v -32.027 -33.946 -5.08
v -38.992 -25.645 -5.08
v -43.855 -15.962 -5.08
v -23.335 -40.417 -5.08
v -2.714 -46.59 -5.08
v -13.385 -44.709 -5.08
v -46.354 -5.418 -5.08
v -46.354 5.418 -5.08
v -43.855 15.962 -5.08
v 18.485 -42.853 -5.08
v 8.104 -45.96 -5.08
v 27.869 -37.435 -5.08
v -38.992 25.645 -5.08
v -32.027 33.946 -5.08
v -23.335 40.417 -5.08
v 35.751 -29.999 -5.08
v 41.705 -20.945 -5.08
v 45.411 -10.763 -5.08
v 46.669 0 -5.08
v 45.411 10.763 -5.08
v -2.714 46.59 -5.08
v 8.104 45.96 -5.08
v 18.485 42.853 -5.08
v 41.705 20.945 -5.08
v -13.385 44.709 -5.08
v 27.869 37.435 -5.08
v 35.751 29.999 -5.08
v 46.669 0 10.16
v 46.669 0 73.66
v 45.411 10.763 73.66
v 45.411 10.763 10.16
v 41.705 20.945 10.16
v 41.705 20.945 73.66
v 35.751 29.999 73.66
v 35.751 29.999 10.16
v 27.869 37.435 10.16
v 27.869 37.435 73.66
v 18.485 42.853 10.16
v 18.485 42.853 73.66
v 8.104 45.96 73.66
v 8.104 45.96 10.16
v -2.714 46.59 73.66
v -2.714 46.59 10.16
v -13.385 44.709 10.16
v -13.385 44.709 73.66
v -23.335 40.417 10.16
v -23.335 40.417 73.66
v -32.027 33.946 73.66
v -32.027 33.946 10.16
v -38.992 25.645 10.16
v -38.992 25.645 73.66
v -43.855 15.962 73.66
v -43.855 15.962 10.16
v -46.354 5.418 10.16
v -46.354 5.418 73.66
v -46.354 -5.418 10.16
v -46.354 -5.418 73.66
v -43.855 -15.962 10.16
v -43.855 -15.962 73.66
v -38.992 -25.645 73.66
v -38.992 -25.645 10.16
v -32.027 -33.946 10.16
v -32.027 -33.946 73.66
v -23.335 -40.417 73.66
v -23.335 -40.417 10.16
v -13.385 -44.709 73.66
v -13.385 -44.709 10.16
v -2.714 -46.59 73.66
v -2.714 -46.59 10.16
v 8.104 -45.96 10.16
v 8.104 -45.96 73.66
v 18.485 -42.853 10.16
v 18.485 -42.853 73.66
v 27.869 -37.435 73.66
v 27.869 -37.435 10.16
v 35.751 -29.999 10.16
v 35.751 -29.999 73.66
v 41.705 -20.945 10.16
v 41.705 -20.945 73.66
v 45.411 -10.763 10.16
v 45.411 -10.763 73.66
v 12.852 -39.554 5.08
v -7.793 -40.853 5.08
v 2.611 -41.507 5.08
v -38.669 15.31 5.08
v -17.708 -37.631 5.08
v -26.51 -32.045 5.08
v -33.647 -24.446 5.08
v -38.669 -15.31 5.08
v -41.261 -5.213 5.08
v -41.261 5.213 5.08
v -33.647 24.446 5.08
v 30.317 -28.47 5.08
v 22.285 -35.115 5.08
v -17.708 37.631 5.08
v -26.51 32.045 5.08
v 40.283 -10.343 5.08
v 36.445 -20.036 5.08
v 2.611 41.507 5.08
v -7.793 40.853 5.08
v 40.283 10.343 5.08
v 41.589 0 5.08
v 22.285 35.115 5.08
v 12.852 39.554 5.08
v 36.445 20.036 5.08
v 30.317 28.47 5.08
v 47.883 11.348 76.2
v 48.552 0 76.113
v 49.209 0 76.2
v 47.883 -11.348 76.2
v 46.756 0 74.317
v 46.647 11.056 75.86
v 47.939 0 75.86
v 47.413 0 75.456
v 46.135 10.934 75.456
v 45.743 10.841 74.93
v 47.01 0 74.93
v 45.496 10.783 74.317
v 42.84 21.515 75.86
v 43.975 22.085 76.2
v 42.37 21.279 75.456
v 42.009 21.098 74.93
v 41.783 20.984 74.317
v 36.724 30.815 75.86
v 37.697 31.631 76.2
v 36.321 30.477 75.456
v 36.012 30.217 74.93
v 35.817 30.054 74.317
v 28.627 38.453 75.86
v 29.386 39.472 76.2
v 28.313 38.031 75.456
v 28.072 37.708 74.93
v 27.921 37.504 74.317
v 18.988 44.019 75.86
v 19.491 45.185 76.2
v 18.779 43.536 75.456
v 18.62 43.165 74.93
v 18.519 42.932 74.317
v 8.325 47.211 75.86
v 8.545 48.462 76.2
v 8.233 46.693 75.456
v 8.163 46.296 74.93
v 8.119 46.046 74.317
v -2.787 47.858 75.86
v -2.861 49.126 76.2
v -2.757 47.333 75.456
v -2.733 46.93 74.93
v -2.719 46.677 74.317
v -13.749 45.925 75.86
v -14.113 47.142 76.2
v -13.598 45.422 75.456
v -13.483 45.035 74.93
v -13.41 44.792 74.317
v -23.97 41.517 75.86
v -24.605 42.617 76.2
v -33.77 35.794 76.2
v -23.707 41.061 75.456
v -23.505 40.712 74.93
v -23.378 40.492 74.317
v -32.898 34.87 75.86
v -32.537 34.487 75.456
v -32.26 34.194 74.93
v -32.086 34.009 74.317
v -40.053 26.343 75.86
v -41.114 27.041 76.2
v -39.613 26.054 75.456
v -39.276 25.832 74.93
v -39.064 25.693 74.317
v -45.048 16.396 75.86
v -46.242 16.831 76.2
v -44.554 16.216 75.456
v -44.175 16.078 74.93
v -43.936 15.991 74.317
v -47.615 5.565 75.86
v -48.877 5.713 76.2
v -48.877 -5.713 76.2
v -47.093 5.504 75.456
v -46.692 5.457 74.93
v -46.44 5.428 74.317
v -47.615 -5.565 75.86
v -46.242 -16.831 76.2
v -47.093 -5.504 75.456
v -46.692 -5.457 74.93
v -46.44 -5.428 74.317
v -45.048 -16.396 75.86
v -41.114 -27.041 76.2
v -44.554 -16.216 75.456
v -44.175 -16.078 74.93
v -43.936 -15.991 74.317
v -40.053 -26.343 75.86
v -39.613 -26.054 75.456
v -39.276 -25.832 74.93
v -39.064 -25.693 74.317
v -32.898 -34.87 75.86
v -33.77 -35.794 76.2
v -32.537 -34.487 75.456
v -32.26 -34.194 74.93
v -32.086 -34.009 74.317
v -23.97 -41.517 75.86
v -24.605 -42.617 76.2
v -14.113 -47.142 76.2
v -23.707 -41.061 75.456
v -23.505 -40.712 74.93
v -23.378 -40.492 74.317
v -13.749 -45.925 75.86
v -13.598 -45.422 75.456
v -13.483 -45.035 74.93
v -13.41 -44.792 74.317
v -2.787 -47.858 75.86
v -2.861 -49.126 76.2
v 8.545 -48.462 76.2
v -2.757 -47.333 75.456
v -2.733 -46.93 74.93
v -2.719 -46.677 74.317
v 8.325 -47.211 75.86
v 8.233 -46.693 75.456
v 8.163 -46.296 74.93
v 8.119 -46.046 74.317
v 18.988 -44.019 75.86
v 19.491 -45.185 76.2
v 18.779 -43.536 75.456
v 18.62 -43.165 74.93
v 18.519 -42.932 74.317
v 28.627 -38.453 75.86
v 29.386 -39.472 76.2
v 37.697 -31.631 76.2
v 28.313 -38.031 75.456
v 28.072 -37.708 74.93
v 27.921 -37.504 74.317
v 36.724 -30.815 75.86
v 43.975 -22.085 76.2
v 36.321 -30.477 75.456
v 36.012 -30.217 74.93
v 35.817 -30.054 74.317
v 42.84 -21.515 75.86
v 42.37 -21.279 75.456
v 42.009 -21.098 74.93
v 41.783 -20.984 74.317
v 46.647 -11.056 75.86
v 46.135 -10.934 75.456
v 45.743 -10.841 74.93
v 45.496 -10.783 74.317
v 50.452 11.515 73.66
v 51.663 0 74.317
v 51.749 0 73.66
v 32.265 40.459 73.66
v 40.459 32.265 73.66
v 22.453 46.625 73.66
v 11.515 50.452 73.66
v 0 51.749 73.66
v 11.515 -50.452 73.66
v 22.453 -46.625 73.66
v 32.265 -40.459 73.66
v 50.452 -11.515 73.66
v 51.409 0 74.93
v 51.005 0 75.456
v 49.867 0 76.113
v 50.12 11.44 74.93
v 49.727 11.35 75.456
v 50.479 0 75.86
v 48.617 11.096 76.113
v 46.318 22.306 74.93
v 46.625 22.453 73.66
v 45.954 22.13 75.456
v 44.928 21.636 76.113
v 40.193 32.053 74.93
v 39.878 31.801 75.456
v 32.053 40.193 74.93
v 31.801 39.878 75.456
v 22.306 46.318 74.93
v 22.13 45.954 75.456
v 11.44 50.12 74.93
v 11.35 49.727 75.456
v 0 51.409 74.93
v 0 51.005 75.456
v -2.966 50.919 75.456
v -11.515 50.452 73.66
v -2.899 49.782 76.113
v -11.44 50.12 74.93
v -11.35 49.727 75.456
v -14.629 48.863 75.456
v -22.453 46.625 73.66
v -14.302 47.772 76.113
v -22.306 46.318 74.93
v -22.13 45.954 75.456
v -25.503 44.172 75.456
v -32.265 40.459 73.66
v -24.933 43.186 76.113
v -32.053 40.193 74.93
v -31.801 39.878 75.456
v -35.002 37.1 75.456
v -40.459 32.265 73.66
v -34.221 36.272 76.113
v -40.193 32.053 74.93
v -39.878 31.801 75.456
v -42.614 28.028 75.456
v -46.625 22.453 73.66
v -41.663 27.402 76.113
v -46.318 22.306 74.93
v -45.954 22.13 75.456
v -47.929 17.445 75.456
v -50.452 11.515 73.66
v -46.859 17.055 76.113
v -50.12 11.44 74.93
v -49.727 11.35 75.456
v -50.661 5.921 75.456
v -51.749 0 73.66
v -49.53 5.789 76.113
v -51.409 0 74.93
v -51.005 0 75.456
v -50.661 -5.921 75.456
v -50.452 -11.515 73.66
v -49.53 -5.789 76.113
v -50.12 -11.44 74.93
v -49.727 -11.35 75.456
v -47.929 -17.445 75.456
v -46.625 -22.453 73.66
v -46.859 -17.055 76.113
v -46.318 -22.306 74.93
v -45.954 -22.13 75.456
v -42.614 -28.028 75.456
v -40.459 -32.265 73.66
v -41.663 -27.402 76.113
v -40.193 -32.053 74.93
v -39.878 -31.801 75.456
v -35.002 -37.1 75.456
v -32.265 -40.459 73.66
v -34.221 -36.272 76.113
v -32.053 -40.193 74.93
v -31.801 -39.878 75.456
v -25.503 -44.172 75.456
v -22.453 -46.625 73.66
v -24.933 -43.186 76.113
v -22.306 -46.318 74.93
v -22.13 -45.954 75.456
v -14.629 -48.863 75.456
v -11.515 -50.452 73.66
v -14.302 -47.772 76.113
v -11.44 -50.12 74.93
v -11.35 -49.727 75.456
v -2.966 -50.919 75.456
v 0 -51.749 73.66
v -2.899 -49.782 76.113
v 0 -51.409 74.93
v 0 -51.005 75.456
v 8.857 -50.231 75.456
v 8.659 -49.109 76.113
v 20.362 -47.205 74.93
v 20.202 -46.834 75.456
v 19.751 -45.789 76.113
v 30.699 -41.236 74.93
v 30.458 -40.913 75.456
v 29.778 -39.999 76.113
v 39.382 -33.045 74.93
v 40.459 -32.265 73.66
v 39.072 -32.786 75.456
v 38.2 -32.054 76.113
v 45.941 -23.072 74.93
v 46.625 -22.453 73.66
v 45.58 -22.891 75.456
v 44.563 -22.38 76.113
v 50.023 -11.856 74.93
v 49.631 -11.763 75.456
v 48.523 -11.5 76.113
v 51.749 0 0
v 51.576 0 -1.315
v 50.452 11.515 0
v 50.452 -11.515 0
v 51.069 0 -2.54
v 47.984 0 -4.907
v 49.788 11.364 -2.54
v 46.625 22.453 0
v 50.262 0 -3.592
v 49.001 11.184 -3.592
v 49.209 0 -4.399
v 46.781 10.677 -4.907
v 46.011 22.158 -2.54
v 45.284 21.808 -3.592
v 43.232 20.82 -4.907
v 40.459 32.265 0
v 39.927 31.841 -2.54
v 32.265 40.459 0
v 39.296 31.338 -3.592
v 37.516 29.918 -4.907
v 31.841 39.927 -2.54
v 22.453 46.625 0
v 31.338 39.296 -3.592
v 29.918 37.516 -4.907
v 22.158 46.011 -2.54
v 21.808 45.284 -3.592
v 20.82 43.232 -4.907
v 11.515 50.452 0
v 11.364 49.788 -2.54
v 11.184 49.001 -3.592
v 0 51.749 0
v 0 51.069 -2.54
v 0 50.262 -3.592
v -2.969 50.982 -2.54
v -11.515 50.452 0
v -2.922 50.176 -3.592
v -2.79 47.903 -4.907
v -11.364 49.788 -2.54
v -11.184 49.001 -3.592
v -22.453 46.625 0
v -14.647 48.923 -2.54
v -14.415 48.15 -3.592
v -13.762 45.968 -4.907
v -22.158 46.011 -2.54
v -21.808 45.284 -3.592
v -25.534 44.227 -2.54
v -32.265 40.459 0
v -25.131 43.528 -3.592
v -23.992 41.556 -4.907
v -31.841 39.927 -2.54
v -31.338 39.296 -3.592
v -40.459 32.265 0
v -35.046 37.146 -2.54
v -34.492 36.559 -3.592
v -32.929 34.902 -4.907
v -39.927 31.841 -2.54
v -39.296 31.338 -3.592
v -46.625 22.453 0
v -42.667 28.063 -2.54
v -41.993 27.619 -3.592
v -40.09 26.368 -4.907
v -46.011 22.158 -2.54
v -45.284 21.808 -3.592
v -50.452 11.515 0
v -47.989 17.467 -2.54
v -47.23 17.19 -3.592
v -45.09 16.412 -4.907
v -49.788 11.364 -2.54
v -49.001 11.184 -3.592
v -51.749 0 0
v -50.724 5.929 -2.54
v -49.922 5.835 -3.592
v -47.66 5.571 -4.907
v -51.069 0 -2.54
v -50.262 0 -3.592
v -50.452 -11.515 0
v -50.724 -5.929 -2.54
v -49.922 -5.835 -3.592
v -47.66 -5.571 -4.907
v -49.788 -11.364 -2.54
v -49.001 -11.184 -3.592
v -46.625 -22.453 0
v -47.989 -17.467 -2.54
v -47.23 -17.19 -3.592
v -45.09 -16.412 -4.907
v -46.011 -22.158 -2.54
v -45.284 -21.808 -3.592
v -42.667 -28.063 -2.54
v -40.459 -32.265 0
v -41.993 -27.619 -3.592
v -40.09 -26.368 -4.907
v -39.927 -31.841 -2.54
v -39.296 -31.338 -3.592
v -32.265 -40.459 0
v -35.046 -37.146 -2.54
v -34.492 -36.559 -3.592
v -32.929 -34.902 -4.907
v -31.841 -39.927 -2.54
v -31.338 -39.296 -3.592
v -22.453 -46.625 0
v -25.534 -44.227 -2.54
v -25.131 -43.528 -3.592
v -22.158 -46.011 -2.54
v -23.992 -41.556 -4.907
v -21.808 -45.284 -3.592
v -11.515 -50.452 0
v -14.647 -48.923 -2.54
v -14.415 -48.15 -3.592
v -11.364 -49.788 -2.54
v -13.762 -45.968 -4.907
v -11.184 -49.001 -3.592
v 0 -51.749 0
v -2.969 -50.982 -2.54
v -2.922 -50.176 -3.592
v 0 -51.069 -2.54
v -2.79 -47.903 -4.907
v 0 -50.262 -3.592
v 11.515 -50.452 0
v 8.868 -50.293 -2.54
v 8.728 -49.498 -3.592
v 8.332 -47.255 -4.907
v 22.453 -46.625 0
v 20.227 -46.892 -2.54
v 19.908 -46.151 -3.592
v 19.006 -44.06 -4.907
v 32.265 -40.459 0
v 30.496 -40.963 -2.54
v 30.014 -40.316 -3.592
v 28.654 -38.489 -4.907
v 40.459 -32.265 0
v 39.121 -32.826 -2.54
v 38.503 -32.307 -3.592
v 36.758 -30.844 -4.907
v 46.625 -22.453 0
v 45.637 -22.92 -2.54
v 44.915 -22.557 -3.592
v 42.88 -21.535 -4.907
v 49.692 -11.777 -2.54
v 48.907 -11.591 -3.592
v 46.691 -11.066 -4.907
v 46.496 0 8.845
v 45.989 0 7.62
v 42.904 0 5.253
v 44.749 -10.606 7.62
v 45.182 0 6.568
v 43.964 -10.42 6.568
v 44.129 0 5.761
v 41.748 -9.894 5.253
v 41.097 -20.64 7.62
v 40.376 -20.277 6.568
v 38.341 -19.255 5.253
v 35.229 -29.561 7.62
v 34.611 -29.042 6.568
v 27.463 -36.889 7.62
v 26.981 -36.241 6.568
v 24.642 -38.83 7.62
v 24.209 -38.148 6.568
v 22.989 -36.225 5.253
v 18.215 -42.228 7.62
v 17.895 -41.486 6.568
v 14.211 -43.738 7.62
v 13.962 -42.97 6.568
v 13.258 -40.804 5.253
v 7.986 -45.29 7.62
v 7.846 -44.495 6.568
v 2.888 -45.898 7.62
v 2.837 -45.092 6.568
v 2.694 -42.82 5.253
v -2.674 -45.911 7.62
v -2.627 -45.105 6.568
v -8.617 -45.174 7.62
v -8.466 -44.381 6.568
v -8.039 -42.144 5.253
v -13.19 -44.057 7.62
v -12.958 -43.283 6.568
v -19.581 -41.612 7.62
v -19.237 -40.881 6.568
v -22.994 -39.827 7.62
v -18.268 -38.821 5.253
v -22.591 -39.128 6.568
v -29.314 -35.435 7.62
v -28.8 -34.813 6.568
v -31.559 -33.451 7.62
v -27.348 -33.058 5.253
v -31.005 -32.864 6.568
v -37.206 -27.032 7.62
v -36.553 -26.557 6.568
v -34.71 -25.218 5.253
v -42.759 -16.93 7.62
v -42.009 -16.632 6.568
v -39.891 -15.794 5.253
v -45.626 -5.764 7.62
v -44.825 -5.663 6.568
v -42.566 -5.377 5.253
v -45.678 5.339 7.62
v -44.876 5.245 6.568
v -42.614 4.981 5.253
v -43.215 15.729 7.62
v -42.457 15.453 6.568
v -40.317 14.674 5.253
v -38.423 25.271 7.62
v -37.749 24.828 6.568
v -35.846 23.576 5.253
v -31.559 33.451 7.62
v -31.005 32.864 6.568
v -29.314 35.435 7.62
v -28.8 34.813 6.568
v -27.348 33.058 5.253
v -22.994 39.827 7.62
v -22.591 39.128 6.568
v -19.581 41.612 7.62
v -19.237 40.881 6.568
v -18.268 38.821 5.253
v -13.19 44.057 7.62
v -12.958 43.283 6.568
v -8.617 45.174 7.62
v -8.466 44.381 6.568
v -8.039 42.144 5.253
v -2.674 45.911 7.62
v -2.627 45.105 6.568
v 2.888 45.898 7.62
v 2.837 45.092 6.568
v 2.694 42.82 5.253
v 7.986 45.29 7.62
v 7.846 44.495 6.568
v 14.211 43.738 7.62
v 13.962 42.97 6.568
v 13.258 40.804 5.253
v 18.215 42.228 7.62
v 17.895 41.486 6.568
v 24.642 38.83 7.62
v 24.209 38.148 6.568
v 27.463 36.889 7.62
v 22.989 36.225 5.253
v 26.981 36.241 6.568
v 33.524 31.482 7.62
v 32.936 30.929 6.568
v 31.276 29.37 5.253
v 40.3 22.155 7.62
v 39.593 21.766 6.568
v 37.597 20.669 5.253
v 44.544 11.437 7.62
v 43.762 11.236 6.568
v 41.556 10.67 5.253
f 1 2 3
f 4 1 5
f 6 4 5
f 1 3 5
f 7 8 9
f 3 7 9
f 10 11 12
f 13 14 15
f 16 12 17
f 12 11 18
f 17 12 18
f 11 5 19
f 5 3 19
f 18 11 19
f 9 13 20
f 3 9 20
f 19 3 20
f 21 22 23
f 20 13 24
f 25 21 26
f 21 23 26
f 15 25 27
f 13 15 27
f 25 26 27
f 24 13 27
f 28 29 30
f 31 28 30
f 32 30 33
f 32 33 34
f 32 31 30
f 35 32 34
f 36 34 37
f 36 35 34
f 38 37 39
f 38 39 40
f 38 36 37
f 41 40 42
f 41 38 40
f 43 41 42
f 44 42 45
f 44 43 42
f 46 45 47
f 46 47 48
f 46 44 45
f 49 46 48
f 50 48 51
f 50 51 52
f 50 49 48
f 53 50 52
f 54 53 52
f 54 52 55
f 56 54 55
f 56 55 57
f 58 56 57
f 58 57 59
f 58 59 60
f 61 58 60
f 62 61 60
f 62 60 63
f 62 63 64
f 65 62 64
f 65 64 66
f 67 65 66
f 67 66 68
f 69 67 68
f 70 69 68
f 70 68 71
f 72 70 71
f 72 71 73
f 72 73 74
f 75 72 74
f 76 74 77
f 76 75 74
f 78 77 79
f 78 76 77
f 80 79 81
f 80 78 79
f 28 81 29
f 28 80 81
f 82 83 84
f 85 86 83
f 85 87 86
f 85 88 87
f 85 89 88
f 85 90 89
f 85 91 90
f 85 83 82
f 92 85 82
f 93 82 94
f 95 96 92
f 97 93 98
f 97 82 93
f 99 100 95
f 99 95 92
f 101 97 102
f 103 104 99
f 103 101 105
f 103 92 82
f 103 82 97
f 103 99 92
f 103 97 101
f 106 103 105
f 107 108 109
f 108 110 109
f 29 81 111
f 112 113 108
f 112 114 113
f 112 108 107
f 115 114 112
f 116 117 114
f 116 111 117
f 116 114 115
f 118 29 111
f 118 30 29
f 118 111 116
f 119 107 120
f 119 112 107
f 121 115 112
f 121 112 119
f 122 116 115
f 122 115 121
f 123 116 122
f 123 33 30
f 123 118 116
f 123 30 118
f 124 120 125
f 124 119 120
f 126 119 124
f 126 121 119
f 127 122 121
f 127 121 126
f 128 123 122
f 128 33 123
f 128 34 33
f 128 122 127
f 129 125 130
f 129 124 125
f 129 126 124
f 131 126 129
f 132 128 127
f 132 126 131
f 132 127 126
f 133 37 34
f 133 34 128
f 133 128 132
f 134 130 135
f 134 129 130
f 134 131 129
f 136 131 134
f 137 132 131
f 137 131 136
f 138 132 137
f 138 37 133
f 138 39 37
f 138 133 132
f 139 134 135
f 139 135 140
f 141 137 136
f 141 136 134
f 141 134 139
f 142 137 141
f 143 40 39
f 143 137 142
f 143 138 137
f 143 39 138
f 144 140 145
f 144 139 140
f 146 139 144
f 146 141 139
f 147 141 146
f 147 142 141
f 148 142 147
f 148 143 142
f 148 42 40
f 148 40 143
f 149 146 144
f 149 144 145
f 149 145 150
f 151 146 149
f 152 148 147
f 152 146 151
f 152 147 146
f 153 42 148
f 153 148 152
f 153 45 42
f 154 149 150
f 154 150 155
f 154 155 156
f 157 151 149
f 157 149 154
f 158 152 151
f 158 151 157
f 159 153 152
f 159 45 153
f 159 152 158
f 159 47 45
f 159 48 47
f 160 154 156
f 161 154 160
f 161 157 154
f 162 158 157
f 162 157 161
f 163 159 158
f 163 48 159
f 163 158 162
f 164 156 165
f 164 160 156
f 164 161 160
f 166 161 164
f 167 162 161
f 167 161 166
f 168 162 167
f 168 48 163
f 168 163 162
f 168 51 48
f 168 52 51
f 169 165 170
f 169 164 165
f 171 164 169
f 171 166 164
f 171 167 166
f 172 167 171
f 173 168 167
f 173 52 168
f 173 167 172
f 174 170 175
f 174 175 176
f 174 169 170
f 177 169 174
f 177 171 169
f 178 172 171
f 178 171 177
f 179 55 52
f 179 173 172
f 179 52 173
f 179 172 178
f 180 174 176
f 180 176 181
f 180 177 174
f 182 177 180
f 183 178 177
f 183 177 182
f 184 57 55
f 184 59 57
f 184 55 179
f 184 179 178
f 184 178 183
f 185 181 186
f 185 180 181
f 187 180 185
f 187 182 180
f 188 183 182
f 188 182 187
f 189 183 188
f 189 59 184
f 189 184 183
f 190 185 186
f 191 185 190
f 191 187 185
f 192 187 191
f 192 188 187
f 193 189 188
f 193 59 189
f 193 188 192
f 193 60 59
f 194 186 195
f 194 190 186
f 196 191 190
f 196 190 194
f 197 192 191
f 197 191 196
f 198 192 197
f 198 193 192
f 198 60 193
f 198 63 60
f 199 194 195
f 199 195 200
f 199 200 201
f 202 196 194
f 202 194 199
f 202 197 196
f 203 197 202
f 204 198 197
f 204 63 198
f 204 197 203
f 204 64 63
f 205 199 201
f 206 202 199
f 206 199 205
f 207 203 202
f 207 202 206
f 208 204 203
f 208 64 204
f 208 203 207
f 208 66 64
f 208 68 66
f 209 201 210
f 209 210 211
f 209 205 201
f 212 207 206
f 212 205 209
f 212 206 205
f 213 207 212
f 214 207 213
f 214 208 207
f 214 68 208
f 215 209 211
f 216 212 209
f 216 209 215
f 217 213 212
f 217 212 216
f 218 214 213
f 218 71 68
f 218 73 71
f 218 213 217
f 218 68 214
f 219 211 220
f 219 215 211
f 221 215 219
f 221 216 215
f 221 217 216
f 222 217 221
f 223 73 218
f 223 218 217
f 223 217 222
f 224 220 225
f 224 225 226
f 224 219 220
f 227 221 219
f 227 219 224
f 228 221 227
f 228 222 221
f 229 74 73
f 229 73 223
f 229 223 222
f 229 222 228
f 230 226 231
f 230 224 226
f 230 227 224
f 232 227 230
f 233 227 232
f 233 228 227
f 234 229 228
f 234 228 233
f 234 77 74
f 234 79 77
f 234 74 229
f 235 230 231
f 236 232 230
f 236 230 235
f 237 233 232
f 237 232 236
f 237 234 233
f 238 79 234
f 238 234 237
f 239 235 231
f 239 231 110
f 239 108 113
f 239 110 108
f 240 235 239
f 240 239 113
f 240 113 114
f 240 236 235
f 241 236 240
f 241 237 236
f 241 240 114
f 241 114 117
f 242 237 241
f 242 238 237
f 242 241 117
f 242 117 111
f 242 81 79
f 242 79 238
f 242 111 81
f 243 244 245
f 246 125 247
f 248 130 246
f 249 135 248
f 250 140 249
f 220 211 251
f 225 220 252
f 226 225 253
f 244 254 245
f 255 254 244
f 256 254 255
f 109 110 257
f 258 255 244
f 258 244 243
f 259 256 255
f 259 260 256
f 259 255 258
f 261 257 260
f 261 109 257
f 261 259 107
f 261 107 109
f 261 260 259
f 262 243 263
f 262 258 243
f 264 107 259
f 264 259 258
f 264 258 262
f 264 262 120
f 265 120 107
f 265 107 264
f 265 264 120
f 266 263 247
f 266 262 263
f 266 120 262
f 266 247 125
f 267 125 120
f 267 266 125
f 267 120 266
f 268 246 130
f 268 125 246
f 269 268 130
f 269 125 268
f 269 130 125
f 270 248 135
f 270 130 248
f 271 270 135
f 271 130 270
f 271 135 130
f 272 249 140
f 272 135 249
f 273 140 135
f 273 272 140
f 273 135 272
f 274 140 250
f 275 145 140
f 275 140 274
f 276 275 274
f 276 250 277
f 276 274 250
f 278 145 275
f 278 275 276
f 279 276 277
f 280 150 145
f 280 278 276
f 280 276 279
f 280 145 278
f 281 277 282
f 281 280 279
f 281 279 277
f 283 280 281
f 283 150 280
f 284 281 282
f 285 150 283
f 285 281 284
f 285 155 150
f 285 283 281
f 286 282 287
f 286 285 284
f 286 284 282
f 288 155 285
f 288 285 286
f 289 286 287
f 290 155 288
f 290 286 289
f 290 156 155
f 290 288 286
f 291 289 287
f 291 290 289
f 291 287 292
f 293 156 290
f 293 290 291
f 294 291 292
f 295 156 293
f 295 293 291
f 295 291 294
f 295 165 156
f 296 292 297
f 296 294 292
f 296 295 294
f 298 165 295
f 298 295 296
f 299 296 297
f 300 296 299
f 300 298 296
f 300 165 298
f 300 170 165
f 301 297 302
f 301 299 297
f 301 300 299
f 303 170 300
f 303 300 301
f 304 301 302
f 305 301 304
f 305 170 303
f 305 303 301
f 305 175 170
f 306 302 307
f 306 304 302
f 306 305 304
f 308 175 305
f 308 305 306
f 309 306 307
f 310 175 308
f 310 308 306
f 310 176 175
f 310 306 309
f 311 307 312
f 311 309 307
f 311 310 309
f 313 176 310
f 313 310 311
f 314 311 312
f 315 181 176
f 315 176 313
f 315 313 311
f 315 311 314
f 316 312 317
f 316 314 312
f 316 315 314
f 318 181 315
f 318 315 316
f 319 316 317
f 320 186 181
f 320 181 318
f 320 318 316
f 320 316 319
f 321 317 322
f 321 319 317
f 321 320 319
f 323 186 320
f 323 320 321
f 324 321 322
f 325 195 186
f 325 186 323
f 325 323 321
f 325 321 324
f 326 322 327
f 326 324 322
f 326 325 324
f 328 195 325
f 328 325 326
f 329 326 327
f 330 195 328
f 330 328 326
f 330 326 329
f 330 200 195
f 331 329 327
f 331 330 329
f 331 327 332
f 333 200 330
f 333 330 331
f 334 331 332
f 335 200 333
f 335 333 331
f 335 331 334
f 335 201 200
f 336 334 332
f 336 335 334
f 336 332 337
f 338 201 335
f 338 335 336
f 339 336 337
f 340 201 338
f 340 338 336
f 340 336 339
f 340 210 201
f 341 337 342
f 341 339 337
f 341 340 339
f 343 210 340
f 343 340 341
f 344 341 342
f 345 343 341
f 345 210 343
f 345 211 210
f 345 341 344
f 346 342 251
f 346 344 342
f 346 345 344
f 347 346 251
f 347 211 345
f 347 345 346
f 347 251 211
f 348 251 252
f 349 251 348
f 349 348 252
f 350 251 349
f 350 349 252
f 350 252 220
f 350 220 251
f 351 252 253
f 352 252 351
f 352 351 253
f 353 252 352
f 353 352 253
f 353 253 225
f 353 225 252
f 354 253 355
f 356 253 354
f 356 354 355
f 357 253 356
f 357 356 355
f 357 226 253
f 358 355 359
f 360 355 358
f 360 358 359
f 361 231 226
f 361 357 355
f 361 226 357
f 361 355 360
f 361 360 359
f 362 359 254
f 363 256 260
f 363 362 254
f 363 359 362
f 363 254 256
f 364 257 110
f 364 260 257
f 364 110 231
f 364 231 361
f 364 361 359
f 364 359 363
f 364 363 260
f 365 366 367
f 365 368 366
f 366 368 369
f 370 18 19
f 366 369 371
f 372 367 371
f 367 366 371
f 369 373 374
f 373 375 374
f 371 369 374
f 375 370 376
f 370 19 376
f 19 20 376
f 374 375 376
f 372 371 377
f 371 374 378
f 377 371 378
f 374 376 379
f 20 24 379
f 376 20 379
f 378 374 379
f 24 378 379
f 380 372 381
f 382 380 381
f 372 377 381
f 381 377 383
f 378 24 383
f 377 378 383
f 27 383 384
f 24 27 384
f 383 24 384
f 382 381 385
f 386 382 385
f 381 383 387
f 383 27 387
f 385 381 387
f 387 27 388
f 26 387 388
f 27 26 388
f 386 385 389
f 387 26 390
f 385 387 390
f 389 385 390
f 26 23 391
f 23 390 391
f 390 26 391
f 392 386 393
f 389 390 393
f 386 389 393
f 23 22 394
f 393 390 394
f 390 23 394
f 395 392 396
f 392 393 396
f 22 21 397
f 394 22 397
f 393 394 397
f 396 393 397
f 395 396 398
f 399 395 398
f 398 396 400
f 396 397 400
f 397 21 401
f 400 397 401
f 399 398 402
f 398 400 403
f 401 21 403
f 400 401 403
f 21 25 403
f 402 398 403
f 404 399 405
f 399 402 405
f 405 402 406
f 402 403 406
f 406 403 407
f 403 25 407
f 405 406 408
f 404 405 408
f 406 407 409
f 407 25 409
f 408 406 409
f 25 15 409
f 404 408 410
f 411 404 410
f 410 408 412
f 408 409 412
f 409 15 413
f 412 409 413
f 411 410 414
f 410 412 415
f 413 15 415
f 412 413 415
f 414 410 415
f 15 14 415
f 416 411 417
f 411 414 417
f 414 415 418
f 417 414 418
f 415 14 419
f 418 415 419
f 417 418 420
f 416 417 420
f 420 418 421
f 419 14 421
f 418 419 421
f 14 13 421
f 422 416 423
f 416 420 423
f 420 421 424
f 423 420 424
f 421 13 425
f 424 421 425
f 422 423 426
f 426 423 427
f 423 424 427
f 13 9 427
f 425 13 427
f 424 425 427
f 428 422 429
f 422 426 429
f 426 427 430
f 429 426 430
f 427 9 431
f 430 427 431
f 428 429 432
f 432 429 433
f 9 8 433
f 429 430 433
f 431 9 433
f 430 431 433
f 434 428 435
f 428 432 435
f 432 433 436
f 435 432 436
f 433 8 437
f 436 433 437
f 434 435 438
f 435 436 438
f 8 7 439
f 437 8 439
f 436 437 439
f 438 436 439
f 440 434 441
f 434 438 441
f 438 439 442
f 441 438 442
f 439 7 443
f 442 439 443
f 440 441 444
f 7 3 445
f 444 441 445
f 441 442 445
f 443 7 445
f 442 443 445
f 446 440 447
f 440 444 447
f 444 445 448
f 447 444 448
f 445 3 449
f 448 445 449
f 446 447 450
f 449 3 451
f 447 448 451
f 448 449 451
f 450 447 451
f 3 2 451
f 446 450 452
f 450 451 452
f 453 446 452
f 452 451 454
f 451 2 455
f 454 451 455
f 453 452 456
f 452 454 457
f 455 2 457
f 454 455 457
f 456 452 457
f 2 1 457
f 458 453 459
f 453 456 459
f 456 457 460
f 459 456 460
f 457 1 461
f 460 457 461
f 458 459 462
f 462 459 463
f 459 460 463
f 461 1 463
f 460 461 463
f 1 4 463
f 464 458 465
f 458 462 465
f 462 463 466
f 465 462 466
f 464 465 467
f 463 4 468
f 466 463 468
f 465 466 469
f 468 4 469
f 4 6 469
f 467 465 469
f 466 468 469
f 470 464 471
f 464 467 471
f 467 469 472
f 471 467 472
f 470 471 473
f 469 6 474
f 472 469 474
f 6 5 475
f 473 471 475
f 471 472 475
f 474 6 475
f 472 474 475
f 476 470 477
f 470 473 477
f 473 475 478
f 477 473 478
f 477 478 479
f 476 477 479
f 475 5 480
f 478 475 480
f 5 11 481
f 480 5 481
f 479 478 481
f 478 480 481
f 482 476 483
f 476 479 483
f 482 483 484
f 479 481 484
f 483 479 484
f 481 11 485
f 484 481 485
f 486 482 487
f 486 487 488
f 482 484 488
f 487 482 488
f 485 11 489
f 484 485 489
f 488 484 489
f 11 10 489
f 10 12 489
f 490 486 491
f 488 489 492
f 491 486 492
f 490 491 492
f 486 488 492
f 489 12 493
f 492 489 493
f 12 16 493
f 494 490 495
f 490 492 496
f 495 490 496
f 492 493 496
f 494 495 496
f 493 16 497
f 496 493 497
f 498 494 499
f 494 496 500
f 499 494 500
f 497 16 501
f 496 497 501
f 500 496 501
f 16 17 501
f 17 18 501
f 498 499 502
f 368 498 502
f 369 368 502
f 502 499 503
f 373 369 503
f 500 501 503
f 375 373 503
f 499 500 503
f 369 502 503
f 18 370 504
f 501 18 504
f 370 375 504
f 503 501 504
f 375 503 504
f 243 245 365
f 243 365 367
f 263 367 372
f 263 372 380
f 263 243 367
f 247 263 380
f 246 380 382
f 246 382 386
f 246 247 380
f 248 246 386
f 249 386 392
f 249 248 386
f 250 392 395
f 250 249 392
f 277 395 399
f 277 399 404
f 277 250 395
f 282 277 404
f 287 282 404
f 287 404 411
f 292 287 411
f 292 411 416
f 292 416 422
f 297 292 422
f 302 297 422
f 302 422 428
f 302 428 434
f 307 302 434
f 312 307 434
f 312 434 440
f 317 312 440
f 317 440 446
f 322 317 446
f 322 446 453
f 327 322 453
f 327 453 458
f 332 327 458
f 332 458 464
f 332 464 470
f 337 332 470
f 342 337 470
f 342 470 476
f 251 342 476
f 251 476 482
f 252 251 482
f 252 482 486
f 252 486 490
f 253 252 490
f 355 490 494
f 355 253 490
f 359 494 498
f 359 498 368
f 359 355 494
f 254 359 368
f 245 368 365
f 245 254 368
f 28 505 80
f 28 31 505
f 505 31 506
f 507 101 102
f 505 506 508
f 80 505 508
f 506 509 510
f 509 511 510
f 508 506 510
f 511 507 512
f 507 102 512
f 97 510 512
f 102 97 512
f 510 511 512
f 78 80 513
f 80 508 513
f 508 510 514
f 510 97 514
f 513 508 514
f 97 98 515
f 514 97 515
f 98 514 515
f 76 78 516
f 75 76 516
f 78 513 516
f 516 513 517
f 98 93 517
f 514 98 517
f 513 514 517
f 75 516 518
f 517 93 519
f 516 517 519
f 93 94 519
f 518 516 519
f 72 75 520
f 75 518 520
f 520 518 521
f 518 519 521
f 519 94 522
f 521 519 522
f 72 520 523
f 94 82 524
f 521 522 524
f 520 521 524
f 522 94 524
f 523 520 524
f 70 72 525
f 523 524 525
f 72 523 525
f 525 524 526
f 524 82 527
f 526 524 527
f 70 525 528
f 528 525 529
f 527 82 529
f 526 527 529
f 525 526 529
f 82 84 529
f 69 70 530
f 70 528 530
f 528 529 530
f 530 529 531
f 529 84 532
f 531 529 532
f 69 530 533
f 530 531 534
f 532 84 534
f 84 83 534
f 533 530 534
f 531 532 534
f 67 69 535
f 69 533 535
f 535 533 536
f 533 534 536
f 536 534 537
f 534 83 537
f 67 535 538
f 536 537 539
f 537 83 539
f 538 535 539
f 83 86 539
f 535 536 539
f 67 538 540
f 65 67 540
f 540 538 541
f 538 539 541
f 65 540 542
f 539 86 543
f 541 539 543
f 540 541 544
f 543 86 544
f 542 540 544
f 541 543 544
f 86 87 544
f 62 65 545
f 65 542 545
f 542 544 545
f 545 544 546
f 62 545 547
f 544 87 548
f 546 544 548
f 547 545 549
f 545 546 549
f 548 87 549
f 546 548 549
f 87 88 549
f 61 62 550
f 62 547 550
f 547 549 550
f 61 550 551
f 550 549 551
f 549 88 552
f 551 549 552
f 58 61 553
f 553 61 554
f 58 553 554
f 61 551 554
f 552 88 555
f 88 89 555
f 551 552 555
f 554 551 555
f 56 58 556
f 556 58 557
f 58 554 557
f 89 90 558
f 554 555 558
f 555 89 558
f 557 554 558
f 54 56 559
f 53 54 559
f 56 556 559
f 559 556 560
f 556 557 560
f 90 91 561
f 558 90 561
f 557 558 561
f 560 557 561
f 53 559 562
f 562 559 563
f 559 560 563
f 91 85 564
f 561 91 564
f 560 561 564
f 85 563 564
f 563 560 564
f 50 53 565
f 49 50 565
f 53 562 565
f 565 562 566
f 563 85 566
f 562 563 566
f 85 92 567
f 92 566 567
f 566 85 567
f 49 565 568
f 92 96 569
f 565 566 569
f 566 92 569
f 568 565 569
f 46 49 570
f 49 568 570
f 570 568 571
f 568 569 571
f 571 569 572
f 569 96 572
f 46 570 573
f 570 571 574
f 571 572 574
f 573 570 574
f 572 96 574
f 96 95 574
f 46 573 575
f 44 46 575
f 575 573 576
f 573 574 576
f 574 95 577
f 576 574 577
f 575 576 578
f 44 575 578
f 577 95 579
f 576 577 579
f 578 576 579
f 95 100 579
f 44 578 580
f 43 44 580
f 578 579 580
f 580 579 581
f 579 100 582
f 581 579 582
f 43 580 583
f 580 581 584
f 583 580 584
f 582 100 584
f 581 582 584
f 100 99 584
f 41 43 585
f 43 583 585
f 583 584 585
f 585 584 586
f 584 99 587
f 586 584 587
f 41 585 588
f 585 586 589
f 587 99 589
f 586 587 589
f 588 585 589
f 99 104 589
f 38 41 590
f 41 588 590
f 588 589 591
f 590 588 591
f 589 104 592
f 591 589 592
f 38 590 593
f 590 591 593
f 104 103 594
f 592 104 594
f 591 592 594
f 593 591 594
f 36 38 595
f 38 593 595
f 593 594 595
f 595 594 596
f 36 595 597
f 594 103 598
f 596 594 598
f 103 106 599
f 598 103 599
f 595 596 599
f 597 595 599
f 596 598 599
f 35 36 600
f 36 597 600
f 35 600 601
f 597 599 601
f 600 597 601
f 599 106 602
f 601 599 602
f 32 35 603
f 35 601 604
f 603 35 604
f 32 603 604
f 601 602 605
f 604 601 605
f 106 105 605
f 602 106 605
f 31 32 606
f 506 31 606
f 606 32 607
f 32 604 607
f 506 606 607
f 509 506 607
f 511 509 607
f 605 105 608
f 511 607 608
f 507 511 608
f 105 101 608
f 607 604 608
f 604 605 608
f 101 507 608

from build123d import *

# Parameters (mm, degrees)
F0_R      = 51.7494214311
F1_DEPTH  = 76.2
F2_T      = -5.08
F1_FACE_R = 51.7494214311
F3_DEPTH  = 5.08
F4_R      = 2.53999
F5_R      = 5.08
F6_R      = 5.07999


# Not quite as in the source:
# - a fillet or chamfer is up to 0.001 mm smaller than in the source, because OpenCascade refuses the exact size


with BuildPart() as f1:
    # F0 (on Top) → F1 (new body)
    with BuildSketch(Plane.XY):
        Circle(F0_R)
    extrude(amount=F1_DEPTH)

    # F2
    f2_openings = [f1.faces().sort_by_distance(p)[0] for p in [
        (0, 0, 76.2),
    ]]
    offset(amount=F2_T, openings=f2_openings)

    # F0 (on Top) + F1_face (on face) → F3 (join)
    with BuildSketch(Plane.XY):
        Circle(F0_R)
    with BuildSketch(Plane(origin=(0, 0, 0), x_dir=(1, 0, 0), z_dir=(0, 0, -1))):
        Circle(F1_FACE_R)
    extrude(amount=-F3_DEPTH, dir=(0, 0, 1))

    # F4 (radius 2.54 in the source; OpenCascade refuses exactly that, so slightly less here)
    f4_edges = [f1.edges().sort_by_distance(p)[0] for p in [
        (-51.749421, 0, 76.2),
        (-46.669421, 0, 76.2),
    ]]
    fillet(f4_edges, radius=F4_R)

    # F5
    f5_edges = [f1.edges().sort_by_distance(p)[0] for p in [
        (-46.669421, 0, 5.08),
    ]]
    fillet(f5_edges, radius=F5_R)

    # F6 (radius 5.08 in the source; OpenCascade refuses exactly that, so slightly less here)
    f6_edges = [f1.edges().sort_by_distance(p)[0] for p in [
        (-51.749421, 0, -5.08),
    ]]
    fillet(f6_edges, radius=F6_R)


solid = f1.part
